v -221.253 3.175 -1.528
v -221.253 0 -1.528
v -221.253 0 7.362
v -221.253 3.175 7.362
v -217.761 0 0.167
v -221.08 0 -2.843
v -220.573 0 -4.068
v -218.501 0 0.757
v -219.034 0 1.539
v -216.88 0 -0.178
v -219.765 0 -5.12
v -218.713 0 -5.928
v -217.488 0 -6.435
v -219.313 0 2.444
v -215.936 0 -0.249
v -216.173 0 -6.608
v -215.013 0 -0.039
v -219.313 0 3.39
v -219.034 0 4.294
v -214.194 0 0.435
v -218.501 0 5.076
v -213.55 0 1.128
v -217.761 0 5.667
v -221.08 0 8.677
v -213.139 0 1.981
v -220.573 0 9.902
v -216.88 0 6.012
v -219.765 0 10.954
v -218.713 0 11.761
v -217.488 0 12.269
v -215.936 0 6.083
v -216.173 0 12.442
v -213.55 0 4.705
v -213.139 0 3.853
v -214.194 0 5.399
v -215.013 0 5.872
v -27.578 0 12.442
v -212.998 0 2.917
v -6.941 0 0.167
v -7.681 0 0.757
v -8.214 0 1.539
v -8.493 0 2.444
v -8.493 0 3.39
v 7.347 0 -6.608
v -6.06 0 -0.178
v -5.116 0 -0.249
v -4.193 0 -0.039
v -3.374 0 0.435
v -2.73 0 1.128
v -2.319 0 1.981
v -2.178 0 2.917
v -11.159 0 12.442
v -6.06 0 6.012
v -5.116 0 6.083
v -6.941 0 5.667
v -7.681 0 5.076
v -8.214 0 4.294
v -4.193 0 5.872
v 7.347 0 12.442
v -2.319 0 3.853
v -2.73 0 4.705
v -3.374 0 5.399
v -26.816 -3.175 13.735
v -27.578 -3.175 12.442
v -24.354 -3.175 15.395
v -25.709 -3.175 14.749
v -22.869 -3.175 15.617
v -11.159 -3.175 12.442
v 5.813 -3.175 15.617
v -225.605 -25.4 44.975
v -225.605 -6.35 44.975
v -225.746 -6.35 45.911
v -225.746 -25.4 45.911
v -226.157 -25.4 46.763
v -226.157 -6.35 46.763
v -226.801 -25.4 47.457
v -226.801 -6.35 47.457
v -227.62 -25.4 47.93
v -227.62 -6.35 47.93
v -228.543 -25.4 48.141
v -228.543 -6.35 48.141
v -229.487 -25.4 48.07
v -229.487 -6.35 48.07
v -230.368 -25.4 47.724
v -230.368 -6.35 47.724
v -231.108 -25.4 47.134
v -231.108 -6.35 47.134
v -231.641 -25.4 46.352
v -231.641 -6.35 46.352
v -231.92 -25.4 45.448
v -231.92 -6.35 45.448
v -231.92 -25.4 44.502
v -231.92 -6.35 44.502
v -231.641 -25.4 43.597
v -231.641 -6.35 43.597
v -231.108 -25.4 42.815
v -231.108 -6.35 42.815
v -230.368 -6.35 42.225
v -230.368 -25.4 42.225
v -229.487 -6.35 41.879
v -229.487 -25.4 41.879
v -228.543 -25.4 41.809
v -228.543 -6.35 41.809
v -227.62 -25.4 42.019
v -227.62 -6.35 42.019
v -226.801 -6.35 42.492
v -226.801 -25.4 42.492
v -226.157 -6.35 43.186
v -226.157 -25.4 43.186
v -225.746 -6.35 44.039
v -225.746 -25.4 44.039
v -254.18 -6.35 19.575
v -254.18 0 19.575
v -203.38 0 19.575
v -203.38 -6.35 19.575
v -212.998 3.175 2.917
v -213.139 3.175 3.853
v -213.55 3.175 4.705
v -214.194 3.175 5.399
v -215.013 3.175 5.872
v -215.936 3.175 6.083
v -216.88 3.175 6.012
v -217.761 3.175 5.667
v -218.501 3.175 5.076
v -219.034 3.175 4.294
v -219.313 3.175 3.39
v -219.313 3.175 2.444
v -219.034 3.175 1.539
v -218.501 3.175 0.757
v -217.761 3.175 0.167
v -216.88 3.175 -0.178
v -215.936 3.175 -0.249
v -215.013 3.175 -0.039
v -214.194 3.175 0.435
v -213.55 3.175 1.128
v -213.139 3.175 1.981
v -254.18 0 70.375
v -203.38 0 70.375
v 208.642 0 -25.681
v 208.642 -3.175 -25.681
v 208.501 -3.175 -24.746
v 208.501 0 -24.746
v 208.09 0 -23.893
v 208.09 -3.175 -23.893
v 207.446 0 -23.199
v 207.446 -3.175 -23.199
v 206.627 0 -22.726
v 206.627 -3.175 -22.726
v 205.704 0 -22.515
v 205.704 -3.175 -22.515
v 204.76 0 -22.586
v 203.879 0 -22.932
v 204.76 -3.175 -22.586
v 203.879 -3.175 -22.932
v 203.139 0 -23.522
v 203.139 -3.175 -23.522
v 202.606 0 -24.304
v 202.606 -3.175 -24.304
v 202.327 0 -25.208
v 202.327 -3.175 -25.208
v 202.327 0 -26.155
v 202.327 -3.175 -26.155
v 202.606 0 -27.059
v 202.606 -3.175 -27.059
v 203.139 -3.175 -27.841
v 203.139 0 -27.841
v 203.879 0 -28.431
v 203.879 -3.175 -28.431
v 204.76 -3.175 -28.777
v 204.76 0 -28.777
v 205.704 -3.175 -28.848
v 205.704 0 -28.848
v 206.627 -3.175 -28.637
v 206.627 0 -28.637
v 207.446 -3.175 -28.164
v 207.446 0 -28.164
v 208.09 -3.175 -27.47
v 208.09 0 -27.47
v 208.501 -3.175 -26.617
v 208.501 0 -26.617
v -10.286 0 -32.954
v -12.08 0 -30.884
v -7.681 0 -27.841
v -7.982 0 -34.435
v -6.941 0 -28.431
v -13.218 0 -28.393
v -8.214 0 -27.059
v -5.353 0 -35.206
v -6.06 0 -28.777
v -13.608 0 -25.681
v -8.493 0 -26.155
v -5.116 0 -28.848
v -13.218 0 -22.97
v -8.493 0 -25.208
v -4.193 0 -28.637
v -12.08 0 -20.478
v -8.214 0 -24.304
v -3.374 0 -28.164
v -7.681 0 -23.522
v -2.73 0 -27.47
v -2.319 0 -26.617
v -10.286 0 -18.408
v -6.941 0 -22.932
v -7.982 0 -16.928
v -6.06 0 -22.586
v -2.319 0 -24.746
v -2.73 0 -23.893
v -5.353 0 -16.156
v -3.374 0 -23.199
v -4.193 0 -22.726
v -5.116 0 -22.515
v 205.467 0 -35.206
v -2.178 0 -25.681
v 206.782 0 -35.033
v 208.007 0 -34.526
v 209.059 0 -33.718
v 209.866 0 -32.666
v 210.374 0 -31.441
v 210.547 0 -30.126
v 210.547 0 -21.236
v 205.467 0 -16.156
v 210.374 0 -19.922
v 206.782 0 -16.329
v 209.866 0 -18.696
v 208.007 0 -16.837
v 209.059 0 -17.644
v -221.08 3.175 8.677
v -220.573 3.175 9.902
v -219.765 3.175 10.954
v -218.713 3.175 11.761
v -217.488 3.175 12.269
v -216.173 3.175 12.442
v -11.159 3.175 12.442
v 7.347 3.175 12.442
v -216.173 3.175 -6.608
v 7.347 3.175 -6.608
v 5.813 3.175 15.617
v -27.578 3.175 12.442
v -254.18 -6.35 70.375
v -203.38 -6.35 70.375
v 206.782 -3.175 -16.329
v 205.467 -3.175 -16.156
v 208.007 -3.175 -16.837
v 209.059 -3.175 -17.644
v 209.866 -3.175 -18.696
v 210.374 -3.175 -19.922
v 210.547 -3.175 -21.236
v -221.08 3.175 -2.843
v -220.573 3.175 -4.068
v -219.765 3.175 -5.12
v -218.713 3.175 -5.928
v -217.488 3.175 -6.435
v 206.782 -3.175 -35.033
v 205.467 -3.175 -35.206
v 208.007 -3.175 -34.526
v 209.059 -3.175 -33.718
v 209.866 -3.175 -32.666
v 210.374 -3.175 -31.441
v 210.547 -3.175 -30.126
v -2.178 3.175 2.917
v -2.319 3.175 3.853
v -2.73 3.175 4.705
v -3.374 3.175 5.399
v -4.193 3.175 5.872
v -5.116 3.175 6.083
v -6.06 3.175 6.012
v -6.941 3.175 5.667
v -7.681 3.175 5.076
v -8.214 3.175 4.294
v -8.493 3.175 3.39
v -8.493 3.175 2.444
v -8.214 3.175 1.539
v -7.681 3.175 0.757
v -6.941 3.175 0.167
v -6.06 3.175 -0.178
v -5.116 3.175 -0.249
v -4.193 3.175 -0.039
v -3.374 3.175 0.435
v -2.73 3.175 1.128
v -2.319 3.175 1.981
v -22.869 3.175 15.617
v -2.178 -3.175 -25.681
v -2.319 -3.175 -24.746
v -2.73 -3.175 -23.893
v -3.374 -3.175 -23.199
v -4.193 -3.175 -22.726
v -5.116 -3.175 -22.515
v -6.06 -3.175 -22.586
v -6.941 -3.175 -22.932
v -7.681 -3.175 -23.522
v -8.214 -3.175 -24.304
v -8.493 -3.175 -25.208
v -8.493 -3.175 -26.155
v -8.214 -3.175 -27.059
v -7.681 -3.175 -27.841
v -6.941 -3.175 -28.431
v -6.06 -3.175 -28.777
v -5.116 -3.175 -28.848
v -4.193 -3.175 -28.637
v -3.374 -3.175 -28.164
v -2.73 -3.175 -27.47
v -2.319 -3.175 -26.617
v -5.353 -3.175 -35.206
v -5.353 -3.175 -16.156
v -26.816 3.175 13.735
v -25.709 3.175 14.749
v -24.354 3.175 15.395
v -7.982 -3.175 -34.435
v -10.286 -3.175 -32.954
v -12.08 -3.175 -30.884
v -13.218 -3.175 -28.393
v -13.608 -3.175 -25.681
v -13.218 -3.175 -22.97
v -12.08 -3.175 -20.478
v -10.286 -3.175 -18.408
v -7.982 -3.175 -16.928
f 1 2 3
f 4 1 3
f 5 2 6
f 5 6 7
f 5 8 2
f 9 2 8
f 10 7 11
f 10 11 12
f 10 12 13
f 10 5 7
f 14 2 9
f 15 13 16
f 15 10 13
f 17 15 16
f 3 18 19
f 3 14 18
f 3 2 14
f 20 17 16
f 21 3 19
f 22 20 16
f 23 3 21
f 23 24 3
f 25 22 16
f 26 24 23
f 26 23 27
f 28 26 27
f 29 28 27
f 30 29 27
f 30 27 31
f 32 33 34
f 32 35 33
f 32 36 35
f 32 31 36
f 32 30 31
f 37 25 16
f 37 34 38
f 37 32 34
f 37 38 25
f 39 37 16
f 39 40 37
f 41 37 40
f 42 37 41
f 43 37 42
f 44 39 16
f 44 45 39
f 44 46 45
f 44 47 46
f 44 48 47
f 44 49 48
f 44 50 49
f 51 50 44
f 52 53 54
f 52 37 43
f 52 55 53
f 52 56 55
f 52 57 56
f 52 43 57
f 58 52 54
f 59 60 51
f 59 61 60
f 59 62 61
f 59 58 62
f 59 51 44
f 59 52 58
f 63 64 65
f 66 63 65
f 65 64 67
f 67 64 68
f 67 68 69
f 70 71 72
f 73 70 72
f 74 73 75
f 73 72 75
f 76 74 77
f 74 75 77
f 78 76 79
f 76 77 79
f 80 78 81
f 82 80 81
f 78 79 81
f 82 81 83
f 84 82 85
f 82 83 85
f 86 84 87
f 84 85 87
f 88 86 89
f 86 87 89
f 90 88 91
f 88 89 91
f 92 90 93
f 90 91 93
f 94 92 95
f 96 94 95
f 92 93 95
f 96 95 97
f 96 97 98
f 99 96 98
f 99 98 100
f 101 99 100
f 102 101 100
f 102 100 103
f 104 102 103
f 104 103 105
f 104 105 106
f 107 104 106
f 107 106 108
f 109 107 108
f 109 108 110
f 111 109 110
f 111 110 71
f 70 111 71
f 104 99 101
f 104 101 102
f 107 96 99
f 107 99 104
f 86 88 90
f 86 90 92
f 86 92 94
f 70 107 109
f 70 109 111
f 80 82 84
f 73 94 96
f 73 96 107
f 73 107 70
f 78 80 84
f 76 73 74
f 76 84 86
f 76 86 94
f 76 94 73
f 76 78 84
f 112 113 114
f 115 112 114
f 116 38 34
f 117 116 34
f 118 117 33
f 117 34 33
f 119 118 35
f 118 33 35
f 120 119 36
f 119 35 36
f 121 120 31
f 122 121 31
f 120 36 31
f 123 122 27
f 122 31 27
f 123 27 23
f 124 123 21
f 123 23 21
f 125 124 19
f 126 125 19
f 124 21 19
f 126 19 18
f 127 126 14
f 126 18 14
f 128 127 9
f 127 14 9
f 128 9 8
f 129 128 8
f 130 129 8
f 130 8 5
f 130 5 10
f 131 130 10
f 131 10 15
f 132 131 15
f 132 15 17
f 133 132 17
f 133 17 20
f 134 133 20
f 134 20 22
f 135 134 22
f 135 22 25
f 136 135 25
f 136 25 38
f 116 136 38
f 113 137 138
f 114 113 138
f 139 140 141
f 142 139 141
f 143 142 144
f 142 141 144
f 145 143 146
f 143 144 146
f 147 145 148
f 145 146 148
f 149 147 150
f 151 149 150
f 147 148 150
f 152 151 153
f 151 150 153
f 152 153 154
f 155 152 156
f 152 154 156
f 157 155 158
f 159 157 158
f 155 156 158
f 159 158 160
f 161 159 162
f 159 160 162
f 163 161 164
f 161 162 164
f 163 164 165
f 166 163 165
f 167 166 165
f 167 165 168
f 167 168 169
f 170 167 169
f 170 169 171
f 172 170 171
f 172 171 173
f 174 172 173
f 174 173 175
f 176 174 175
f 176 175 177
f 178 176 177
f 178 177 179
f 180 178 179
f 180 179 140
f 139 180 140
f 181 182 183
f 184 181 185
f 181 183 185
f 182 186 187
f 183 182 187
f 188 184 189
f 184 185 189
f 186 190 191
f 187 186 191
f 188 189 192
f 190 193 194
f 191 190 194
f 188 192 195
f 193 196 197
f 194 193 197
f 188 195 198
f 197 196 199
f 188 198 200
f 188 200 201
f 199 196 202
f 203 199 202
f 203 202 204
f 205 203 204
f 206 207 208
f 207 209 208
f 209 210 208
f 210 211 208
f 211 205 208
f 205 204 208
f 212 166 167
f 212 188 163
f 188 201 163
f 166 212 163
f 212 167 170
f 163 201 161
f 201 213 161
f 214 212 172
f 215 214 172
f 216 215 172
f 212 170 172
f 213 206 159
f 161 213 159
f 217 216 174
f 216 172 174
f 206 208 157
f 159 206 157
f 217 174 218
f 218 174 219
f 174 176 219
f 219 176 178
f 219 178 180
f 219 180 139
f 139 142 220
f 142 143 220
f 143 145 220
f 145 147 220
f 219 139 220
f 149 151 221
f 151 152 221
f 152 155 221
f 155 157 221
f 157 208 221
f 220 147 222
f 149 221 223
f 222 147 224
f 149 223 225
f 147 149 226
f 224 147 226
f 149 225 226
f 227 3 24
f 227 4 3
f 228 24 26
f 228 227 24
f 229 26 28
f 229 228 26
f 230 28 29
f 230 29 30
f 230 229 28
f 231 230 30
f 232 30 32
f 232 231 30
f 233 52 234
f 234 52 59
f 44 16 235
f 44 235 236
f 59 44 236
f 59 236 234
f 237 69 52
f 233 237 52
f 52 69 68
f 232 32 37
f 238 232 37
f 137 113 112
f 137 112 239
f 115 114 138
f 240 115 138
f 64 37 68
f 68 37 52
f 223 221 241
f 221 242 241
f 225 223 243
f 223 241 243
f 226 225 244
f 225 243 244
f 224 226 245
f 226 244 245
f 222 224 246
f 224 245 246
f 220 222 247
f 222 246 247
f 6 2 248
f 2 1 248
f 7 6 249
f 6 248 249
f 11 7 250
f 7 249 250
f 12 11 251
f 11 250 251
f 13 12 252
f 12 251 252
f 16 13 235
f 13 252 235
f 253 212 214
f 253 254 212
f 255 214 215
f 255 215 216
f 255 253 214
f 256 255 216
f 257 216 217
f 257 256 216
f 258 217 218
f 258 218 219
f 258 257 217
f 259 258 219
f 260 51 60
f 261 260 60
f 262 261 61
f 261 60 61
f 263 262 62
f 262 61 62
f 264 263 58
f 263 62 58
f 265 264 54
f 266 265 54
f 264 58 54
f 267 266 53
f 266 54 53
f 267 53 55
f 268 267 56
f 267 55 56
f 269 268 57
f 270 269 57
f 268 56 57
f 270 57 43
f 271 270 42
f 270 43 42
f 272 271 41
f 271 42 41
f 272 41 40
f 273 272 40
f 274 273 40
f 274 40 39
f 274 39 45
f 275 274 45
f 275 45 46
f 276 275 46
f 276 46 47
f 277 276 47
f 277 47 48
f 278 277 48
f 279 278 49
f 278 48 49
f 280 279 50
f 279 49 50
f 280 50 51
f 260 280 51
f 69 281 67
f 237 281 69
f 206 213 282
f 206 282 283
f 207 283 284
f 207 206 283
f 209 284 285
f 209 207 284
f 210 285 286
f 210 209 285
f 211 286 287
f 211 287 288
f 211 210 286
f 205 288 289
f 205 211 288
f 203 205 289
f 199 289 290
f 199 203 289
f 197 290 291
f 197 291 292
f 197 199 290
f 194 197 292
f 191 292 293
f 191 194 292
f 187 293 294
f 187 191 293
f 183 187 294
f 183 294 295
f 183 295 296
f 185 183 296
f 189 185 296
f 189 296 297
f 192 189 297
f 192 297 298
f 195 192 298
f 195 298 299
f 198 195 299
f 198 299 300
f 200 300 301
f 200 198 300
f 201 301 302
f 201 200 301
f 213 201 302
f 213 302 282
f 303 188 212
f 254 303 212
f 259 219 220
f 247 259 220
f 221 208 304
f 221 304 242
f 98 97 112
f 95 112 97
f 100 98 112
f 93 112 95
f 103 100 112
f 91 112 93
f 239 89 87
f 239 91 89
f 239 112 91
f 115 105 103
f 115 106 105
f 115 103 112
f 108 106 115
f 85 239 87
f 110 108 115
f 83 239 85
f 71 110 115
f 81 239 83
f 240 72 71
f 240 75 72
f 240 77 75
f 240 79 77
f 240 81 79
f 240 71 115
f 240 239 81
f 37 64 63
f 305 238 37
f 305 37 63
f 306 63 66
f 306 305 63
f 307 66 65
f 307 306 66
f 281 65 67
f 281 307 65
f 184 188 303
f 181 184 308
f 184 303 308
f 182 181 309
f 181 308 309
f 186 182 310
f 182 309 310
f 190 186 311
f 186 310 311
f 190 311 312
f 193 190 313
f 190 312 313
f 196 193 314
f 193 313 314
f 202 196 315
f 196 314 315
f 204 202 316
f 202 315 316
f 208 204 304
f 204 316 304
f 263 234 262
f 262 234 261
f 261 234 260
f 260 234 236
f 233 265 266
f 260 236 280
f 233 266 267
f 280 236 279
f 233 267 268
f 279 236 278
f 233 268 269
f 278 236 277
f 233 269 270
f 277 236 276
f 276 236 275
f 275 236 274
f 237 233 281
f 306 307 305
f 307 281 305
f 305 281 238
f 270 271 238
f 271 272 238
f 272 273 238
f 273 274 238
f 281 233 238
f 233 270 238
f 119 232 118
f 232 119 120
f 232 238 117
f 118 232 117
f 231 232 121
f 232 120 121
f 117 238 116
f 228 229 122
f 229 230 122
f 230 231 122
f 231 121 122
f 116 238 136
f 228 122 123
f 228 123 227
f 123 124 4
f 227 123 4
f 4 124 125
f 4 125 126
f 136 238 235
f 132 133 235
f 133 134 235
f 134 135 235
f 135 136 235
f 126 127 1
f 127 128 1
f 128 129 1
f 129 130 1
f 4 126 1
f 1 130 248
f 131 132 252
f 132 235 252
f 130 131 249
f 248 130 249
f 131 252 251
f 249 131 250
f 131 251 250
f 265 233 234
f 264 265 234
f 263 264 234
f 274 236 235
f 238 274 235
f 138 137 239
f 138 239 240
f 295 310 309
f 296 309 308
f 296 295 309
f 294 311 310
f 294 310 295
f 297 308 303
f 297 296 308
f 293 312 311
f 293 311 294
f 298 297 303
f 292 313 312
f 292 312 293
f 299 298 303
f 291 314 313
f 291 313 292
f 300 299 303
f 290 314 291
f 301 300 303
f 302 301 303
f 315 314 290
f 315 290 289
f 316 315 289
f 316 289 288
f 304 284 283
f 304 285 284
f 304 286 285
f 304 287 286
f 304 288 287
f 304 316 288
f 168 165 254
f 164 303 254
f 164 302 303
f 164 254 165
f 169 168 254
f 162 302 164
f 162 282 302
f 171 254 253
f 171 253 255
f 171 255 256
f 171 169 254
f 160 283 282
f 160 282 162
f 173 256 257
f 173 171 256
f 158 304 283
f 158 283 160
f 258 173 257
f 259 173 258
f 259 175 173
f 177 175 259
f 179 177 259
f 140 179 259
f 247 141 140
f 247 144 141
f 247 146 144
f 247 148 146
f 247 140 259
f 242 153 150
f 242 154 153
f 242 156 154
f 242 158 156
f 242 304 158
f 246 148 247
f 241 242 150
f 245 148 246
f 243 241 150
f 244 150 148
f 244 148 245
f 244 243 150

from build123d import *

# Parameters (mm, degrees)
F0_W        = 228.6
F0_H        = 19.05
F0_R        = 3.175
F1_DEPTH    = 3.175
F2_DEPTH    = 3.175
F3_R        = 5.08
F4_R        = 5.08
F5_W        = 34.925
F5_H        = 3.175
F6_DEPTH    = 3.175
F7_T1_DEPTH = 14.9482151929
F7_T3_DEPTH = 14.9482150036
F7_T5_DEPTH = 29.8964301965
F9_DEPTH    = 25.4
F11_DEPTH   = 25.4
F12_R       = 3.175
F13_DEPTH   = 3.176
F14_R       = 3.175
F15_DEPTH   = 6.351
F16_W       = 50.8
F16_H       = 50.8
F16_R       = 3.175
F17_DEPTH   = 6.35
F18_DEPTH   = 25.4


# Not quite as in the source:
# - a fillet or chamfer that OpenCascade refuses, or shapes differently, is made with other operations: its cross-section is extruded or revolved along the edge and cut away or added


with BuildPart() as f1:
    # F0 (on Front) → F1 (new body)
    with BuildSketch(Plane.XZ):
        with Locations((-106.9532044351, 2.9169026516)):
            Rectangle(F0_W, F0_H)
        with Locations((-5.3532044351, 2.9169026516)):
            Circle(F0_R, mode=Mode.SUBTRACT)
    extrude(amount=-F1_DEPTH)

    # F3
    f3_edges = [f1.edges().sort_by_distance(p)[0] for p in [
        (-221.253204, 1.5875, 12.441903),
        (-221.253204, 1.5875, -6.608097),
    ]]
    fillet(f3_edges, radius=F3_R)

    # F5 (on face) → F6 (join)
    with BuildSketch(Plane.XY.offset(12.4419026516)):
        Polygon((10.5217955649, -3.175), (10.5217955649, 3.175), (7.3467955649, 3.175), (7.3467955649, 0), (-27.5782044351, 0), (-27.5782044351, -3.175), align=None)
        with Locations((-10.1157044351, 1.5875)):
            Rectangle(F5_W, F5_H)
    extrude(amount=F6_DEPTH)

    # F7: fillet of radius 5.08 on 2 edges, made by hand

    # F7_s2 → F7_t1 (cut)
    with BuildSketch(Plane.XZ.offset(-14.9482150983)):
        with BuildLine():
            ThreePointArc((-27.5782044351, 12.4419026516), (-25.7087247272, 14.7490161354), (-22.8689183958, 15.6169026516))
            Line((-22.8689183958, 15.6169026516), (-27.5782044351, 15.6169026516))
            Line((-27.5782044351, 15.6169026516), (-27.5782044351, 12.4419026516))
        make_face()
    extrude(amount=F7_T1_DEPTH, mode=Mode.SUBTRACT)

    # F7_s4 → F7_t3 (cut)
    with BuildSketch(Plane.XZ.offset(9.46e-08)):
        with BuildLine():
            ThreePointArc((-27.5782044351, 12.4419026516), (-25.7087247272, 14.7490161354), (-22.8689183958, 15.6169026516))
            Line((-22.8689183958, 15.6169026516), (-27.5782044351, 15.6169026516))
            Line((-27.5782044351, 15.6169026516), (-27.5782044351, 12.4419026516))
        make_face()
    extrude(amount=F7_T3_DEPTH, mode=Mode.SUBTRACT)

    # F7_s6 → F7_t5 (cut)
    with BuildSketch(Plane.XZ.offset(-14.9482150983)):
        with BuildLine():
            ThreePointArc((5.8125095256, 15.6169026516), (8.652315857, 14.7490161354), (10.5217955649, 12.4419026516))
            Line((10.5217955649, 12.4419026516), (10.5217955649, 15.6169026516))
            Line((10.5217955649, 15.6169026516), (5.8125095256, 15.6169026516))
        make_face()
    extrude(amount=F7_T5_DEPTH, mode=Mode.SUBTRACT)

    # F8 (on face) → F9 (cut)
    with BuildSketch(Plane.XZ.offset(3.175)):
        with BuildLine():
            Line((5.8125095256, 15.6169026516), (-11.1592710018, 12.4419026516))
            Line((-11.1592710018, 12.4419026516), (10.5217955649, 12.4419026516))
            ThreePointArc((10.5217955649, 12.4419026516), (8.652315857, 14.7490161354), (5.8125095256, 15.6169026516))
        make_face()
    extrude(amount=-F9_DEPTH, mode=Mode.SUBTRACT)

    # F12 (on face) → F13 (cut, through all)
    with BuildSketch(Plane.XZ):
        with Locations((-216.1732044351, 2.9169026516)):
            Circle(F12_R)
    extrude(amount=-F13_DEPTH, mode=Mode.SUBTRACT)


with BuildPart() as f2:
    # F0 (on Front) → F2 (new body)
    with BuildSketch(Plane.XZ):
        with Locations((96.2467955649, -25.6813844749)):
            Rectangle(F0_W, F0_H)
        with Locations((-5.3532044351, -25.6813844749)):
            Circle(F0_R, mode=Mode.SUBTRACT)
    extrude(amount=F2_DEPTH)

    # F4
    f4_edges = [f2.edges().sort_by_distance(p)[0] for p in [
        (210.546796, -1.5875, -16.156384),
        (210.546796, -1.5875, -35.206384),
    ]]
    fillet(f4_edges, radius=F4_R)

    # F10 (on face) → F11 (cut)
    with BuildSketch(Plane.XZ.offset(3.175)):
        with BuildLine():
            ThreePointArc((-5.3532044351, -35.2063844749), (-13.6081711663, -25.6813844749), (-5.3532044351, -16.1563844749))
            Line((-5.3532044351, -16.1563844749), (-18.0532044351, -16.1563844749))
            Line((-18.0532044351, -16.1563844749), (-18.0532044351, -35.2063844749))
            Line((-18.0532044351, -35.2063844749), (-5.3532044351, -35.2063844749))
        make_face()
    extrude(amount=-F11_DEPTH, mode=Mode.SUBTRACT)

    # F14 (on face) → F15 (cut, through all)
    with BuildSketch(Plane.XZ.offset(3.175)):
        with Locations((205.4667955649, -25.6813844749)):
            Circle(F14_R)
    extrude(amount=-F15_DEPTH, mode=Mode.SUBTRACT)


with BuildPart() as f17:
    # F16 (on Front) → F17 (new body)
    with BuildSketch(Plane.XZ):
        with Locations((-228.7803910017, 44.9747502148)):
            Rectangle(F16_W, F16_H)
        with Locations((-228.7803910017, 44.9747502148)):
            Circle(F16_R, mode=Mode.SUBTRACT)
    extrude(amount=F17_DEPTH)

    # F16 (on Front) → F18 (join)
    with BuildSketch(Plane.XZ):
        with Locations((-228.7803910017, 44.9747502148)):
            Circle(F16_R)
    extrude(amount=F18_DEPTH)


solid = Compound([f1.part, f2.part, f17.part])
